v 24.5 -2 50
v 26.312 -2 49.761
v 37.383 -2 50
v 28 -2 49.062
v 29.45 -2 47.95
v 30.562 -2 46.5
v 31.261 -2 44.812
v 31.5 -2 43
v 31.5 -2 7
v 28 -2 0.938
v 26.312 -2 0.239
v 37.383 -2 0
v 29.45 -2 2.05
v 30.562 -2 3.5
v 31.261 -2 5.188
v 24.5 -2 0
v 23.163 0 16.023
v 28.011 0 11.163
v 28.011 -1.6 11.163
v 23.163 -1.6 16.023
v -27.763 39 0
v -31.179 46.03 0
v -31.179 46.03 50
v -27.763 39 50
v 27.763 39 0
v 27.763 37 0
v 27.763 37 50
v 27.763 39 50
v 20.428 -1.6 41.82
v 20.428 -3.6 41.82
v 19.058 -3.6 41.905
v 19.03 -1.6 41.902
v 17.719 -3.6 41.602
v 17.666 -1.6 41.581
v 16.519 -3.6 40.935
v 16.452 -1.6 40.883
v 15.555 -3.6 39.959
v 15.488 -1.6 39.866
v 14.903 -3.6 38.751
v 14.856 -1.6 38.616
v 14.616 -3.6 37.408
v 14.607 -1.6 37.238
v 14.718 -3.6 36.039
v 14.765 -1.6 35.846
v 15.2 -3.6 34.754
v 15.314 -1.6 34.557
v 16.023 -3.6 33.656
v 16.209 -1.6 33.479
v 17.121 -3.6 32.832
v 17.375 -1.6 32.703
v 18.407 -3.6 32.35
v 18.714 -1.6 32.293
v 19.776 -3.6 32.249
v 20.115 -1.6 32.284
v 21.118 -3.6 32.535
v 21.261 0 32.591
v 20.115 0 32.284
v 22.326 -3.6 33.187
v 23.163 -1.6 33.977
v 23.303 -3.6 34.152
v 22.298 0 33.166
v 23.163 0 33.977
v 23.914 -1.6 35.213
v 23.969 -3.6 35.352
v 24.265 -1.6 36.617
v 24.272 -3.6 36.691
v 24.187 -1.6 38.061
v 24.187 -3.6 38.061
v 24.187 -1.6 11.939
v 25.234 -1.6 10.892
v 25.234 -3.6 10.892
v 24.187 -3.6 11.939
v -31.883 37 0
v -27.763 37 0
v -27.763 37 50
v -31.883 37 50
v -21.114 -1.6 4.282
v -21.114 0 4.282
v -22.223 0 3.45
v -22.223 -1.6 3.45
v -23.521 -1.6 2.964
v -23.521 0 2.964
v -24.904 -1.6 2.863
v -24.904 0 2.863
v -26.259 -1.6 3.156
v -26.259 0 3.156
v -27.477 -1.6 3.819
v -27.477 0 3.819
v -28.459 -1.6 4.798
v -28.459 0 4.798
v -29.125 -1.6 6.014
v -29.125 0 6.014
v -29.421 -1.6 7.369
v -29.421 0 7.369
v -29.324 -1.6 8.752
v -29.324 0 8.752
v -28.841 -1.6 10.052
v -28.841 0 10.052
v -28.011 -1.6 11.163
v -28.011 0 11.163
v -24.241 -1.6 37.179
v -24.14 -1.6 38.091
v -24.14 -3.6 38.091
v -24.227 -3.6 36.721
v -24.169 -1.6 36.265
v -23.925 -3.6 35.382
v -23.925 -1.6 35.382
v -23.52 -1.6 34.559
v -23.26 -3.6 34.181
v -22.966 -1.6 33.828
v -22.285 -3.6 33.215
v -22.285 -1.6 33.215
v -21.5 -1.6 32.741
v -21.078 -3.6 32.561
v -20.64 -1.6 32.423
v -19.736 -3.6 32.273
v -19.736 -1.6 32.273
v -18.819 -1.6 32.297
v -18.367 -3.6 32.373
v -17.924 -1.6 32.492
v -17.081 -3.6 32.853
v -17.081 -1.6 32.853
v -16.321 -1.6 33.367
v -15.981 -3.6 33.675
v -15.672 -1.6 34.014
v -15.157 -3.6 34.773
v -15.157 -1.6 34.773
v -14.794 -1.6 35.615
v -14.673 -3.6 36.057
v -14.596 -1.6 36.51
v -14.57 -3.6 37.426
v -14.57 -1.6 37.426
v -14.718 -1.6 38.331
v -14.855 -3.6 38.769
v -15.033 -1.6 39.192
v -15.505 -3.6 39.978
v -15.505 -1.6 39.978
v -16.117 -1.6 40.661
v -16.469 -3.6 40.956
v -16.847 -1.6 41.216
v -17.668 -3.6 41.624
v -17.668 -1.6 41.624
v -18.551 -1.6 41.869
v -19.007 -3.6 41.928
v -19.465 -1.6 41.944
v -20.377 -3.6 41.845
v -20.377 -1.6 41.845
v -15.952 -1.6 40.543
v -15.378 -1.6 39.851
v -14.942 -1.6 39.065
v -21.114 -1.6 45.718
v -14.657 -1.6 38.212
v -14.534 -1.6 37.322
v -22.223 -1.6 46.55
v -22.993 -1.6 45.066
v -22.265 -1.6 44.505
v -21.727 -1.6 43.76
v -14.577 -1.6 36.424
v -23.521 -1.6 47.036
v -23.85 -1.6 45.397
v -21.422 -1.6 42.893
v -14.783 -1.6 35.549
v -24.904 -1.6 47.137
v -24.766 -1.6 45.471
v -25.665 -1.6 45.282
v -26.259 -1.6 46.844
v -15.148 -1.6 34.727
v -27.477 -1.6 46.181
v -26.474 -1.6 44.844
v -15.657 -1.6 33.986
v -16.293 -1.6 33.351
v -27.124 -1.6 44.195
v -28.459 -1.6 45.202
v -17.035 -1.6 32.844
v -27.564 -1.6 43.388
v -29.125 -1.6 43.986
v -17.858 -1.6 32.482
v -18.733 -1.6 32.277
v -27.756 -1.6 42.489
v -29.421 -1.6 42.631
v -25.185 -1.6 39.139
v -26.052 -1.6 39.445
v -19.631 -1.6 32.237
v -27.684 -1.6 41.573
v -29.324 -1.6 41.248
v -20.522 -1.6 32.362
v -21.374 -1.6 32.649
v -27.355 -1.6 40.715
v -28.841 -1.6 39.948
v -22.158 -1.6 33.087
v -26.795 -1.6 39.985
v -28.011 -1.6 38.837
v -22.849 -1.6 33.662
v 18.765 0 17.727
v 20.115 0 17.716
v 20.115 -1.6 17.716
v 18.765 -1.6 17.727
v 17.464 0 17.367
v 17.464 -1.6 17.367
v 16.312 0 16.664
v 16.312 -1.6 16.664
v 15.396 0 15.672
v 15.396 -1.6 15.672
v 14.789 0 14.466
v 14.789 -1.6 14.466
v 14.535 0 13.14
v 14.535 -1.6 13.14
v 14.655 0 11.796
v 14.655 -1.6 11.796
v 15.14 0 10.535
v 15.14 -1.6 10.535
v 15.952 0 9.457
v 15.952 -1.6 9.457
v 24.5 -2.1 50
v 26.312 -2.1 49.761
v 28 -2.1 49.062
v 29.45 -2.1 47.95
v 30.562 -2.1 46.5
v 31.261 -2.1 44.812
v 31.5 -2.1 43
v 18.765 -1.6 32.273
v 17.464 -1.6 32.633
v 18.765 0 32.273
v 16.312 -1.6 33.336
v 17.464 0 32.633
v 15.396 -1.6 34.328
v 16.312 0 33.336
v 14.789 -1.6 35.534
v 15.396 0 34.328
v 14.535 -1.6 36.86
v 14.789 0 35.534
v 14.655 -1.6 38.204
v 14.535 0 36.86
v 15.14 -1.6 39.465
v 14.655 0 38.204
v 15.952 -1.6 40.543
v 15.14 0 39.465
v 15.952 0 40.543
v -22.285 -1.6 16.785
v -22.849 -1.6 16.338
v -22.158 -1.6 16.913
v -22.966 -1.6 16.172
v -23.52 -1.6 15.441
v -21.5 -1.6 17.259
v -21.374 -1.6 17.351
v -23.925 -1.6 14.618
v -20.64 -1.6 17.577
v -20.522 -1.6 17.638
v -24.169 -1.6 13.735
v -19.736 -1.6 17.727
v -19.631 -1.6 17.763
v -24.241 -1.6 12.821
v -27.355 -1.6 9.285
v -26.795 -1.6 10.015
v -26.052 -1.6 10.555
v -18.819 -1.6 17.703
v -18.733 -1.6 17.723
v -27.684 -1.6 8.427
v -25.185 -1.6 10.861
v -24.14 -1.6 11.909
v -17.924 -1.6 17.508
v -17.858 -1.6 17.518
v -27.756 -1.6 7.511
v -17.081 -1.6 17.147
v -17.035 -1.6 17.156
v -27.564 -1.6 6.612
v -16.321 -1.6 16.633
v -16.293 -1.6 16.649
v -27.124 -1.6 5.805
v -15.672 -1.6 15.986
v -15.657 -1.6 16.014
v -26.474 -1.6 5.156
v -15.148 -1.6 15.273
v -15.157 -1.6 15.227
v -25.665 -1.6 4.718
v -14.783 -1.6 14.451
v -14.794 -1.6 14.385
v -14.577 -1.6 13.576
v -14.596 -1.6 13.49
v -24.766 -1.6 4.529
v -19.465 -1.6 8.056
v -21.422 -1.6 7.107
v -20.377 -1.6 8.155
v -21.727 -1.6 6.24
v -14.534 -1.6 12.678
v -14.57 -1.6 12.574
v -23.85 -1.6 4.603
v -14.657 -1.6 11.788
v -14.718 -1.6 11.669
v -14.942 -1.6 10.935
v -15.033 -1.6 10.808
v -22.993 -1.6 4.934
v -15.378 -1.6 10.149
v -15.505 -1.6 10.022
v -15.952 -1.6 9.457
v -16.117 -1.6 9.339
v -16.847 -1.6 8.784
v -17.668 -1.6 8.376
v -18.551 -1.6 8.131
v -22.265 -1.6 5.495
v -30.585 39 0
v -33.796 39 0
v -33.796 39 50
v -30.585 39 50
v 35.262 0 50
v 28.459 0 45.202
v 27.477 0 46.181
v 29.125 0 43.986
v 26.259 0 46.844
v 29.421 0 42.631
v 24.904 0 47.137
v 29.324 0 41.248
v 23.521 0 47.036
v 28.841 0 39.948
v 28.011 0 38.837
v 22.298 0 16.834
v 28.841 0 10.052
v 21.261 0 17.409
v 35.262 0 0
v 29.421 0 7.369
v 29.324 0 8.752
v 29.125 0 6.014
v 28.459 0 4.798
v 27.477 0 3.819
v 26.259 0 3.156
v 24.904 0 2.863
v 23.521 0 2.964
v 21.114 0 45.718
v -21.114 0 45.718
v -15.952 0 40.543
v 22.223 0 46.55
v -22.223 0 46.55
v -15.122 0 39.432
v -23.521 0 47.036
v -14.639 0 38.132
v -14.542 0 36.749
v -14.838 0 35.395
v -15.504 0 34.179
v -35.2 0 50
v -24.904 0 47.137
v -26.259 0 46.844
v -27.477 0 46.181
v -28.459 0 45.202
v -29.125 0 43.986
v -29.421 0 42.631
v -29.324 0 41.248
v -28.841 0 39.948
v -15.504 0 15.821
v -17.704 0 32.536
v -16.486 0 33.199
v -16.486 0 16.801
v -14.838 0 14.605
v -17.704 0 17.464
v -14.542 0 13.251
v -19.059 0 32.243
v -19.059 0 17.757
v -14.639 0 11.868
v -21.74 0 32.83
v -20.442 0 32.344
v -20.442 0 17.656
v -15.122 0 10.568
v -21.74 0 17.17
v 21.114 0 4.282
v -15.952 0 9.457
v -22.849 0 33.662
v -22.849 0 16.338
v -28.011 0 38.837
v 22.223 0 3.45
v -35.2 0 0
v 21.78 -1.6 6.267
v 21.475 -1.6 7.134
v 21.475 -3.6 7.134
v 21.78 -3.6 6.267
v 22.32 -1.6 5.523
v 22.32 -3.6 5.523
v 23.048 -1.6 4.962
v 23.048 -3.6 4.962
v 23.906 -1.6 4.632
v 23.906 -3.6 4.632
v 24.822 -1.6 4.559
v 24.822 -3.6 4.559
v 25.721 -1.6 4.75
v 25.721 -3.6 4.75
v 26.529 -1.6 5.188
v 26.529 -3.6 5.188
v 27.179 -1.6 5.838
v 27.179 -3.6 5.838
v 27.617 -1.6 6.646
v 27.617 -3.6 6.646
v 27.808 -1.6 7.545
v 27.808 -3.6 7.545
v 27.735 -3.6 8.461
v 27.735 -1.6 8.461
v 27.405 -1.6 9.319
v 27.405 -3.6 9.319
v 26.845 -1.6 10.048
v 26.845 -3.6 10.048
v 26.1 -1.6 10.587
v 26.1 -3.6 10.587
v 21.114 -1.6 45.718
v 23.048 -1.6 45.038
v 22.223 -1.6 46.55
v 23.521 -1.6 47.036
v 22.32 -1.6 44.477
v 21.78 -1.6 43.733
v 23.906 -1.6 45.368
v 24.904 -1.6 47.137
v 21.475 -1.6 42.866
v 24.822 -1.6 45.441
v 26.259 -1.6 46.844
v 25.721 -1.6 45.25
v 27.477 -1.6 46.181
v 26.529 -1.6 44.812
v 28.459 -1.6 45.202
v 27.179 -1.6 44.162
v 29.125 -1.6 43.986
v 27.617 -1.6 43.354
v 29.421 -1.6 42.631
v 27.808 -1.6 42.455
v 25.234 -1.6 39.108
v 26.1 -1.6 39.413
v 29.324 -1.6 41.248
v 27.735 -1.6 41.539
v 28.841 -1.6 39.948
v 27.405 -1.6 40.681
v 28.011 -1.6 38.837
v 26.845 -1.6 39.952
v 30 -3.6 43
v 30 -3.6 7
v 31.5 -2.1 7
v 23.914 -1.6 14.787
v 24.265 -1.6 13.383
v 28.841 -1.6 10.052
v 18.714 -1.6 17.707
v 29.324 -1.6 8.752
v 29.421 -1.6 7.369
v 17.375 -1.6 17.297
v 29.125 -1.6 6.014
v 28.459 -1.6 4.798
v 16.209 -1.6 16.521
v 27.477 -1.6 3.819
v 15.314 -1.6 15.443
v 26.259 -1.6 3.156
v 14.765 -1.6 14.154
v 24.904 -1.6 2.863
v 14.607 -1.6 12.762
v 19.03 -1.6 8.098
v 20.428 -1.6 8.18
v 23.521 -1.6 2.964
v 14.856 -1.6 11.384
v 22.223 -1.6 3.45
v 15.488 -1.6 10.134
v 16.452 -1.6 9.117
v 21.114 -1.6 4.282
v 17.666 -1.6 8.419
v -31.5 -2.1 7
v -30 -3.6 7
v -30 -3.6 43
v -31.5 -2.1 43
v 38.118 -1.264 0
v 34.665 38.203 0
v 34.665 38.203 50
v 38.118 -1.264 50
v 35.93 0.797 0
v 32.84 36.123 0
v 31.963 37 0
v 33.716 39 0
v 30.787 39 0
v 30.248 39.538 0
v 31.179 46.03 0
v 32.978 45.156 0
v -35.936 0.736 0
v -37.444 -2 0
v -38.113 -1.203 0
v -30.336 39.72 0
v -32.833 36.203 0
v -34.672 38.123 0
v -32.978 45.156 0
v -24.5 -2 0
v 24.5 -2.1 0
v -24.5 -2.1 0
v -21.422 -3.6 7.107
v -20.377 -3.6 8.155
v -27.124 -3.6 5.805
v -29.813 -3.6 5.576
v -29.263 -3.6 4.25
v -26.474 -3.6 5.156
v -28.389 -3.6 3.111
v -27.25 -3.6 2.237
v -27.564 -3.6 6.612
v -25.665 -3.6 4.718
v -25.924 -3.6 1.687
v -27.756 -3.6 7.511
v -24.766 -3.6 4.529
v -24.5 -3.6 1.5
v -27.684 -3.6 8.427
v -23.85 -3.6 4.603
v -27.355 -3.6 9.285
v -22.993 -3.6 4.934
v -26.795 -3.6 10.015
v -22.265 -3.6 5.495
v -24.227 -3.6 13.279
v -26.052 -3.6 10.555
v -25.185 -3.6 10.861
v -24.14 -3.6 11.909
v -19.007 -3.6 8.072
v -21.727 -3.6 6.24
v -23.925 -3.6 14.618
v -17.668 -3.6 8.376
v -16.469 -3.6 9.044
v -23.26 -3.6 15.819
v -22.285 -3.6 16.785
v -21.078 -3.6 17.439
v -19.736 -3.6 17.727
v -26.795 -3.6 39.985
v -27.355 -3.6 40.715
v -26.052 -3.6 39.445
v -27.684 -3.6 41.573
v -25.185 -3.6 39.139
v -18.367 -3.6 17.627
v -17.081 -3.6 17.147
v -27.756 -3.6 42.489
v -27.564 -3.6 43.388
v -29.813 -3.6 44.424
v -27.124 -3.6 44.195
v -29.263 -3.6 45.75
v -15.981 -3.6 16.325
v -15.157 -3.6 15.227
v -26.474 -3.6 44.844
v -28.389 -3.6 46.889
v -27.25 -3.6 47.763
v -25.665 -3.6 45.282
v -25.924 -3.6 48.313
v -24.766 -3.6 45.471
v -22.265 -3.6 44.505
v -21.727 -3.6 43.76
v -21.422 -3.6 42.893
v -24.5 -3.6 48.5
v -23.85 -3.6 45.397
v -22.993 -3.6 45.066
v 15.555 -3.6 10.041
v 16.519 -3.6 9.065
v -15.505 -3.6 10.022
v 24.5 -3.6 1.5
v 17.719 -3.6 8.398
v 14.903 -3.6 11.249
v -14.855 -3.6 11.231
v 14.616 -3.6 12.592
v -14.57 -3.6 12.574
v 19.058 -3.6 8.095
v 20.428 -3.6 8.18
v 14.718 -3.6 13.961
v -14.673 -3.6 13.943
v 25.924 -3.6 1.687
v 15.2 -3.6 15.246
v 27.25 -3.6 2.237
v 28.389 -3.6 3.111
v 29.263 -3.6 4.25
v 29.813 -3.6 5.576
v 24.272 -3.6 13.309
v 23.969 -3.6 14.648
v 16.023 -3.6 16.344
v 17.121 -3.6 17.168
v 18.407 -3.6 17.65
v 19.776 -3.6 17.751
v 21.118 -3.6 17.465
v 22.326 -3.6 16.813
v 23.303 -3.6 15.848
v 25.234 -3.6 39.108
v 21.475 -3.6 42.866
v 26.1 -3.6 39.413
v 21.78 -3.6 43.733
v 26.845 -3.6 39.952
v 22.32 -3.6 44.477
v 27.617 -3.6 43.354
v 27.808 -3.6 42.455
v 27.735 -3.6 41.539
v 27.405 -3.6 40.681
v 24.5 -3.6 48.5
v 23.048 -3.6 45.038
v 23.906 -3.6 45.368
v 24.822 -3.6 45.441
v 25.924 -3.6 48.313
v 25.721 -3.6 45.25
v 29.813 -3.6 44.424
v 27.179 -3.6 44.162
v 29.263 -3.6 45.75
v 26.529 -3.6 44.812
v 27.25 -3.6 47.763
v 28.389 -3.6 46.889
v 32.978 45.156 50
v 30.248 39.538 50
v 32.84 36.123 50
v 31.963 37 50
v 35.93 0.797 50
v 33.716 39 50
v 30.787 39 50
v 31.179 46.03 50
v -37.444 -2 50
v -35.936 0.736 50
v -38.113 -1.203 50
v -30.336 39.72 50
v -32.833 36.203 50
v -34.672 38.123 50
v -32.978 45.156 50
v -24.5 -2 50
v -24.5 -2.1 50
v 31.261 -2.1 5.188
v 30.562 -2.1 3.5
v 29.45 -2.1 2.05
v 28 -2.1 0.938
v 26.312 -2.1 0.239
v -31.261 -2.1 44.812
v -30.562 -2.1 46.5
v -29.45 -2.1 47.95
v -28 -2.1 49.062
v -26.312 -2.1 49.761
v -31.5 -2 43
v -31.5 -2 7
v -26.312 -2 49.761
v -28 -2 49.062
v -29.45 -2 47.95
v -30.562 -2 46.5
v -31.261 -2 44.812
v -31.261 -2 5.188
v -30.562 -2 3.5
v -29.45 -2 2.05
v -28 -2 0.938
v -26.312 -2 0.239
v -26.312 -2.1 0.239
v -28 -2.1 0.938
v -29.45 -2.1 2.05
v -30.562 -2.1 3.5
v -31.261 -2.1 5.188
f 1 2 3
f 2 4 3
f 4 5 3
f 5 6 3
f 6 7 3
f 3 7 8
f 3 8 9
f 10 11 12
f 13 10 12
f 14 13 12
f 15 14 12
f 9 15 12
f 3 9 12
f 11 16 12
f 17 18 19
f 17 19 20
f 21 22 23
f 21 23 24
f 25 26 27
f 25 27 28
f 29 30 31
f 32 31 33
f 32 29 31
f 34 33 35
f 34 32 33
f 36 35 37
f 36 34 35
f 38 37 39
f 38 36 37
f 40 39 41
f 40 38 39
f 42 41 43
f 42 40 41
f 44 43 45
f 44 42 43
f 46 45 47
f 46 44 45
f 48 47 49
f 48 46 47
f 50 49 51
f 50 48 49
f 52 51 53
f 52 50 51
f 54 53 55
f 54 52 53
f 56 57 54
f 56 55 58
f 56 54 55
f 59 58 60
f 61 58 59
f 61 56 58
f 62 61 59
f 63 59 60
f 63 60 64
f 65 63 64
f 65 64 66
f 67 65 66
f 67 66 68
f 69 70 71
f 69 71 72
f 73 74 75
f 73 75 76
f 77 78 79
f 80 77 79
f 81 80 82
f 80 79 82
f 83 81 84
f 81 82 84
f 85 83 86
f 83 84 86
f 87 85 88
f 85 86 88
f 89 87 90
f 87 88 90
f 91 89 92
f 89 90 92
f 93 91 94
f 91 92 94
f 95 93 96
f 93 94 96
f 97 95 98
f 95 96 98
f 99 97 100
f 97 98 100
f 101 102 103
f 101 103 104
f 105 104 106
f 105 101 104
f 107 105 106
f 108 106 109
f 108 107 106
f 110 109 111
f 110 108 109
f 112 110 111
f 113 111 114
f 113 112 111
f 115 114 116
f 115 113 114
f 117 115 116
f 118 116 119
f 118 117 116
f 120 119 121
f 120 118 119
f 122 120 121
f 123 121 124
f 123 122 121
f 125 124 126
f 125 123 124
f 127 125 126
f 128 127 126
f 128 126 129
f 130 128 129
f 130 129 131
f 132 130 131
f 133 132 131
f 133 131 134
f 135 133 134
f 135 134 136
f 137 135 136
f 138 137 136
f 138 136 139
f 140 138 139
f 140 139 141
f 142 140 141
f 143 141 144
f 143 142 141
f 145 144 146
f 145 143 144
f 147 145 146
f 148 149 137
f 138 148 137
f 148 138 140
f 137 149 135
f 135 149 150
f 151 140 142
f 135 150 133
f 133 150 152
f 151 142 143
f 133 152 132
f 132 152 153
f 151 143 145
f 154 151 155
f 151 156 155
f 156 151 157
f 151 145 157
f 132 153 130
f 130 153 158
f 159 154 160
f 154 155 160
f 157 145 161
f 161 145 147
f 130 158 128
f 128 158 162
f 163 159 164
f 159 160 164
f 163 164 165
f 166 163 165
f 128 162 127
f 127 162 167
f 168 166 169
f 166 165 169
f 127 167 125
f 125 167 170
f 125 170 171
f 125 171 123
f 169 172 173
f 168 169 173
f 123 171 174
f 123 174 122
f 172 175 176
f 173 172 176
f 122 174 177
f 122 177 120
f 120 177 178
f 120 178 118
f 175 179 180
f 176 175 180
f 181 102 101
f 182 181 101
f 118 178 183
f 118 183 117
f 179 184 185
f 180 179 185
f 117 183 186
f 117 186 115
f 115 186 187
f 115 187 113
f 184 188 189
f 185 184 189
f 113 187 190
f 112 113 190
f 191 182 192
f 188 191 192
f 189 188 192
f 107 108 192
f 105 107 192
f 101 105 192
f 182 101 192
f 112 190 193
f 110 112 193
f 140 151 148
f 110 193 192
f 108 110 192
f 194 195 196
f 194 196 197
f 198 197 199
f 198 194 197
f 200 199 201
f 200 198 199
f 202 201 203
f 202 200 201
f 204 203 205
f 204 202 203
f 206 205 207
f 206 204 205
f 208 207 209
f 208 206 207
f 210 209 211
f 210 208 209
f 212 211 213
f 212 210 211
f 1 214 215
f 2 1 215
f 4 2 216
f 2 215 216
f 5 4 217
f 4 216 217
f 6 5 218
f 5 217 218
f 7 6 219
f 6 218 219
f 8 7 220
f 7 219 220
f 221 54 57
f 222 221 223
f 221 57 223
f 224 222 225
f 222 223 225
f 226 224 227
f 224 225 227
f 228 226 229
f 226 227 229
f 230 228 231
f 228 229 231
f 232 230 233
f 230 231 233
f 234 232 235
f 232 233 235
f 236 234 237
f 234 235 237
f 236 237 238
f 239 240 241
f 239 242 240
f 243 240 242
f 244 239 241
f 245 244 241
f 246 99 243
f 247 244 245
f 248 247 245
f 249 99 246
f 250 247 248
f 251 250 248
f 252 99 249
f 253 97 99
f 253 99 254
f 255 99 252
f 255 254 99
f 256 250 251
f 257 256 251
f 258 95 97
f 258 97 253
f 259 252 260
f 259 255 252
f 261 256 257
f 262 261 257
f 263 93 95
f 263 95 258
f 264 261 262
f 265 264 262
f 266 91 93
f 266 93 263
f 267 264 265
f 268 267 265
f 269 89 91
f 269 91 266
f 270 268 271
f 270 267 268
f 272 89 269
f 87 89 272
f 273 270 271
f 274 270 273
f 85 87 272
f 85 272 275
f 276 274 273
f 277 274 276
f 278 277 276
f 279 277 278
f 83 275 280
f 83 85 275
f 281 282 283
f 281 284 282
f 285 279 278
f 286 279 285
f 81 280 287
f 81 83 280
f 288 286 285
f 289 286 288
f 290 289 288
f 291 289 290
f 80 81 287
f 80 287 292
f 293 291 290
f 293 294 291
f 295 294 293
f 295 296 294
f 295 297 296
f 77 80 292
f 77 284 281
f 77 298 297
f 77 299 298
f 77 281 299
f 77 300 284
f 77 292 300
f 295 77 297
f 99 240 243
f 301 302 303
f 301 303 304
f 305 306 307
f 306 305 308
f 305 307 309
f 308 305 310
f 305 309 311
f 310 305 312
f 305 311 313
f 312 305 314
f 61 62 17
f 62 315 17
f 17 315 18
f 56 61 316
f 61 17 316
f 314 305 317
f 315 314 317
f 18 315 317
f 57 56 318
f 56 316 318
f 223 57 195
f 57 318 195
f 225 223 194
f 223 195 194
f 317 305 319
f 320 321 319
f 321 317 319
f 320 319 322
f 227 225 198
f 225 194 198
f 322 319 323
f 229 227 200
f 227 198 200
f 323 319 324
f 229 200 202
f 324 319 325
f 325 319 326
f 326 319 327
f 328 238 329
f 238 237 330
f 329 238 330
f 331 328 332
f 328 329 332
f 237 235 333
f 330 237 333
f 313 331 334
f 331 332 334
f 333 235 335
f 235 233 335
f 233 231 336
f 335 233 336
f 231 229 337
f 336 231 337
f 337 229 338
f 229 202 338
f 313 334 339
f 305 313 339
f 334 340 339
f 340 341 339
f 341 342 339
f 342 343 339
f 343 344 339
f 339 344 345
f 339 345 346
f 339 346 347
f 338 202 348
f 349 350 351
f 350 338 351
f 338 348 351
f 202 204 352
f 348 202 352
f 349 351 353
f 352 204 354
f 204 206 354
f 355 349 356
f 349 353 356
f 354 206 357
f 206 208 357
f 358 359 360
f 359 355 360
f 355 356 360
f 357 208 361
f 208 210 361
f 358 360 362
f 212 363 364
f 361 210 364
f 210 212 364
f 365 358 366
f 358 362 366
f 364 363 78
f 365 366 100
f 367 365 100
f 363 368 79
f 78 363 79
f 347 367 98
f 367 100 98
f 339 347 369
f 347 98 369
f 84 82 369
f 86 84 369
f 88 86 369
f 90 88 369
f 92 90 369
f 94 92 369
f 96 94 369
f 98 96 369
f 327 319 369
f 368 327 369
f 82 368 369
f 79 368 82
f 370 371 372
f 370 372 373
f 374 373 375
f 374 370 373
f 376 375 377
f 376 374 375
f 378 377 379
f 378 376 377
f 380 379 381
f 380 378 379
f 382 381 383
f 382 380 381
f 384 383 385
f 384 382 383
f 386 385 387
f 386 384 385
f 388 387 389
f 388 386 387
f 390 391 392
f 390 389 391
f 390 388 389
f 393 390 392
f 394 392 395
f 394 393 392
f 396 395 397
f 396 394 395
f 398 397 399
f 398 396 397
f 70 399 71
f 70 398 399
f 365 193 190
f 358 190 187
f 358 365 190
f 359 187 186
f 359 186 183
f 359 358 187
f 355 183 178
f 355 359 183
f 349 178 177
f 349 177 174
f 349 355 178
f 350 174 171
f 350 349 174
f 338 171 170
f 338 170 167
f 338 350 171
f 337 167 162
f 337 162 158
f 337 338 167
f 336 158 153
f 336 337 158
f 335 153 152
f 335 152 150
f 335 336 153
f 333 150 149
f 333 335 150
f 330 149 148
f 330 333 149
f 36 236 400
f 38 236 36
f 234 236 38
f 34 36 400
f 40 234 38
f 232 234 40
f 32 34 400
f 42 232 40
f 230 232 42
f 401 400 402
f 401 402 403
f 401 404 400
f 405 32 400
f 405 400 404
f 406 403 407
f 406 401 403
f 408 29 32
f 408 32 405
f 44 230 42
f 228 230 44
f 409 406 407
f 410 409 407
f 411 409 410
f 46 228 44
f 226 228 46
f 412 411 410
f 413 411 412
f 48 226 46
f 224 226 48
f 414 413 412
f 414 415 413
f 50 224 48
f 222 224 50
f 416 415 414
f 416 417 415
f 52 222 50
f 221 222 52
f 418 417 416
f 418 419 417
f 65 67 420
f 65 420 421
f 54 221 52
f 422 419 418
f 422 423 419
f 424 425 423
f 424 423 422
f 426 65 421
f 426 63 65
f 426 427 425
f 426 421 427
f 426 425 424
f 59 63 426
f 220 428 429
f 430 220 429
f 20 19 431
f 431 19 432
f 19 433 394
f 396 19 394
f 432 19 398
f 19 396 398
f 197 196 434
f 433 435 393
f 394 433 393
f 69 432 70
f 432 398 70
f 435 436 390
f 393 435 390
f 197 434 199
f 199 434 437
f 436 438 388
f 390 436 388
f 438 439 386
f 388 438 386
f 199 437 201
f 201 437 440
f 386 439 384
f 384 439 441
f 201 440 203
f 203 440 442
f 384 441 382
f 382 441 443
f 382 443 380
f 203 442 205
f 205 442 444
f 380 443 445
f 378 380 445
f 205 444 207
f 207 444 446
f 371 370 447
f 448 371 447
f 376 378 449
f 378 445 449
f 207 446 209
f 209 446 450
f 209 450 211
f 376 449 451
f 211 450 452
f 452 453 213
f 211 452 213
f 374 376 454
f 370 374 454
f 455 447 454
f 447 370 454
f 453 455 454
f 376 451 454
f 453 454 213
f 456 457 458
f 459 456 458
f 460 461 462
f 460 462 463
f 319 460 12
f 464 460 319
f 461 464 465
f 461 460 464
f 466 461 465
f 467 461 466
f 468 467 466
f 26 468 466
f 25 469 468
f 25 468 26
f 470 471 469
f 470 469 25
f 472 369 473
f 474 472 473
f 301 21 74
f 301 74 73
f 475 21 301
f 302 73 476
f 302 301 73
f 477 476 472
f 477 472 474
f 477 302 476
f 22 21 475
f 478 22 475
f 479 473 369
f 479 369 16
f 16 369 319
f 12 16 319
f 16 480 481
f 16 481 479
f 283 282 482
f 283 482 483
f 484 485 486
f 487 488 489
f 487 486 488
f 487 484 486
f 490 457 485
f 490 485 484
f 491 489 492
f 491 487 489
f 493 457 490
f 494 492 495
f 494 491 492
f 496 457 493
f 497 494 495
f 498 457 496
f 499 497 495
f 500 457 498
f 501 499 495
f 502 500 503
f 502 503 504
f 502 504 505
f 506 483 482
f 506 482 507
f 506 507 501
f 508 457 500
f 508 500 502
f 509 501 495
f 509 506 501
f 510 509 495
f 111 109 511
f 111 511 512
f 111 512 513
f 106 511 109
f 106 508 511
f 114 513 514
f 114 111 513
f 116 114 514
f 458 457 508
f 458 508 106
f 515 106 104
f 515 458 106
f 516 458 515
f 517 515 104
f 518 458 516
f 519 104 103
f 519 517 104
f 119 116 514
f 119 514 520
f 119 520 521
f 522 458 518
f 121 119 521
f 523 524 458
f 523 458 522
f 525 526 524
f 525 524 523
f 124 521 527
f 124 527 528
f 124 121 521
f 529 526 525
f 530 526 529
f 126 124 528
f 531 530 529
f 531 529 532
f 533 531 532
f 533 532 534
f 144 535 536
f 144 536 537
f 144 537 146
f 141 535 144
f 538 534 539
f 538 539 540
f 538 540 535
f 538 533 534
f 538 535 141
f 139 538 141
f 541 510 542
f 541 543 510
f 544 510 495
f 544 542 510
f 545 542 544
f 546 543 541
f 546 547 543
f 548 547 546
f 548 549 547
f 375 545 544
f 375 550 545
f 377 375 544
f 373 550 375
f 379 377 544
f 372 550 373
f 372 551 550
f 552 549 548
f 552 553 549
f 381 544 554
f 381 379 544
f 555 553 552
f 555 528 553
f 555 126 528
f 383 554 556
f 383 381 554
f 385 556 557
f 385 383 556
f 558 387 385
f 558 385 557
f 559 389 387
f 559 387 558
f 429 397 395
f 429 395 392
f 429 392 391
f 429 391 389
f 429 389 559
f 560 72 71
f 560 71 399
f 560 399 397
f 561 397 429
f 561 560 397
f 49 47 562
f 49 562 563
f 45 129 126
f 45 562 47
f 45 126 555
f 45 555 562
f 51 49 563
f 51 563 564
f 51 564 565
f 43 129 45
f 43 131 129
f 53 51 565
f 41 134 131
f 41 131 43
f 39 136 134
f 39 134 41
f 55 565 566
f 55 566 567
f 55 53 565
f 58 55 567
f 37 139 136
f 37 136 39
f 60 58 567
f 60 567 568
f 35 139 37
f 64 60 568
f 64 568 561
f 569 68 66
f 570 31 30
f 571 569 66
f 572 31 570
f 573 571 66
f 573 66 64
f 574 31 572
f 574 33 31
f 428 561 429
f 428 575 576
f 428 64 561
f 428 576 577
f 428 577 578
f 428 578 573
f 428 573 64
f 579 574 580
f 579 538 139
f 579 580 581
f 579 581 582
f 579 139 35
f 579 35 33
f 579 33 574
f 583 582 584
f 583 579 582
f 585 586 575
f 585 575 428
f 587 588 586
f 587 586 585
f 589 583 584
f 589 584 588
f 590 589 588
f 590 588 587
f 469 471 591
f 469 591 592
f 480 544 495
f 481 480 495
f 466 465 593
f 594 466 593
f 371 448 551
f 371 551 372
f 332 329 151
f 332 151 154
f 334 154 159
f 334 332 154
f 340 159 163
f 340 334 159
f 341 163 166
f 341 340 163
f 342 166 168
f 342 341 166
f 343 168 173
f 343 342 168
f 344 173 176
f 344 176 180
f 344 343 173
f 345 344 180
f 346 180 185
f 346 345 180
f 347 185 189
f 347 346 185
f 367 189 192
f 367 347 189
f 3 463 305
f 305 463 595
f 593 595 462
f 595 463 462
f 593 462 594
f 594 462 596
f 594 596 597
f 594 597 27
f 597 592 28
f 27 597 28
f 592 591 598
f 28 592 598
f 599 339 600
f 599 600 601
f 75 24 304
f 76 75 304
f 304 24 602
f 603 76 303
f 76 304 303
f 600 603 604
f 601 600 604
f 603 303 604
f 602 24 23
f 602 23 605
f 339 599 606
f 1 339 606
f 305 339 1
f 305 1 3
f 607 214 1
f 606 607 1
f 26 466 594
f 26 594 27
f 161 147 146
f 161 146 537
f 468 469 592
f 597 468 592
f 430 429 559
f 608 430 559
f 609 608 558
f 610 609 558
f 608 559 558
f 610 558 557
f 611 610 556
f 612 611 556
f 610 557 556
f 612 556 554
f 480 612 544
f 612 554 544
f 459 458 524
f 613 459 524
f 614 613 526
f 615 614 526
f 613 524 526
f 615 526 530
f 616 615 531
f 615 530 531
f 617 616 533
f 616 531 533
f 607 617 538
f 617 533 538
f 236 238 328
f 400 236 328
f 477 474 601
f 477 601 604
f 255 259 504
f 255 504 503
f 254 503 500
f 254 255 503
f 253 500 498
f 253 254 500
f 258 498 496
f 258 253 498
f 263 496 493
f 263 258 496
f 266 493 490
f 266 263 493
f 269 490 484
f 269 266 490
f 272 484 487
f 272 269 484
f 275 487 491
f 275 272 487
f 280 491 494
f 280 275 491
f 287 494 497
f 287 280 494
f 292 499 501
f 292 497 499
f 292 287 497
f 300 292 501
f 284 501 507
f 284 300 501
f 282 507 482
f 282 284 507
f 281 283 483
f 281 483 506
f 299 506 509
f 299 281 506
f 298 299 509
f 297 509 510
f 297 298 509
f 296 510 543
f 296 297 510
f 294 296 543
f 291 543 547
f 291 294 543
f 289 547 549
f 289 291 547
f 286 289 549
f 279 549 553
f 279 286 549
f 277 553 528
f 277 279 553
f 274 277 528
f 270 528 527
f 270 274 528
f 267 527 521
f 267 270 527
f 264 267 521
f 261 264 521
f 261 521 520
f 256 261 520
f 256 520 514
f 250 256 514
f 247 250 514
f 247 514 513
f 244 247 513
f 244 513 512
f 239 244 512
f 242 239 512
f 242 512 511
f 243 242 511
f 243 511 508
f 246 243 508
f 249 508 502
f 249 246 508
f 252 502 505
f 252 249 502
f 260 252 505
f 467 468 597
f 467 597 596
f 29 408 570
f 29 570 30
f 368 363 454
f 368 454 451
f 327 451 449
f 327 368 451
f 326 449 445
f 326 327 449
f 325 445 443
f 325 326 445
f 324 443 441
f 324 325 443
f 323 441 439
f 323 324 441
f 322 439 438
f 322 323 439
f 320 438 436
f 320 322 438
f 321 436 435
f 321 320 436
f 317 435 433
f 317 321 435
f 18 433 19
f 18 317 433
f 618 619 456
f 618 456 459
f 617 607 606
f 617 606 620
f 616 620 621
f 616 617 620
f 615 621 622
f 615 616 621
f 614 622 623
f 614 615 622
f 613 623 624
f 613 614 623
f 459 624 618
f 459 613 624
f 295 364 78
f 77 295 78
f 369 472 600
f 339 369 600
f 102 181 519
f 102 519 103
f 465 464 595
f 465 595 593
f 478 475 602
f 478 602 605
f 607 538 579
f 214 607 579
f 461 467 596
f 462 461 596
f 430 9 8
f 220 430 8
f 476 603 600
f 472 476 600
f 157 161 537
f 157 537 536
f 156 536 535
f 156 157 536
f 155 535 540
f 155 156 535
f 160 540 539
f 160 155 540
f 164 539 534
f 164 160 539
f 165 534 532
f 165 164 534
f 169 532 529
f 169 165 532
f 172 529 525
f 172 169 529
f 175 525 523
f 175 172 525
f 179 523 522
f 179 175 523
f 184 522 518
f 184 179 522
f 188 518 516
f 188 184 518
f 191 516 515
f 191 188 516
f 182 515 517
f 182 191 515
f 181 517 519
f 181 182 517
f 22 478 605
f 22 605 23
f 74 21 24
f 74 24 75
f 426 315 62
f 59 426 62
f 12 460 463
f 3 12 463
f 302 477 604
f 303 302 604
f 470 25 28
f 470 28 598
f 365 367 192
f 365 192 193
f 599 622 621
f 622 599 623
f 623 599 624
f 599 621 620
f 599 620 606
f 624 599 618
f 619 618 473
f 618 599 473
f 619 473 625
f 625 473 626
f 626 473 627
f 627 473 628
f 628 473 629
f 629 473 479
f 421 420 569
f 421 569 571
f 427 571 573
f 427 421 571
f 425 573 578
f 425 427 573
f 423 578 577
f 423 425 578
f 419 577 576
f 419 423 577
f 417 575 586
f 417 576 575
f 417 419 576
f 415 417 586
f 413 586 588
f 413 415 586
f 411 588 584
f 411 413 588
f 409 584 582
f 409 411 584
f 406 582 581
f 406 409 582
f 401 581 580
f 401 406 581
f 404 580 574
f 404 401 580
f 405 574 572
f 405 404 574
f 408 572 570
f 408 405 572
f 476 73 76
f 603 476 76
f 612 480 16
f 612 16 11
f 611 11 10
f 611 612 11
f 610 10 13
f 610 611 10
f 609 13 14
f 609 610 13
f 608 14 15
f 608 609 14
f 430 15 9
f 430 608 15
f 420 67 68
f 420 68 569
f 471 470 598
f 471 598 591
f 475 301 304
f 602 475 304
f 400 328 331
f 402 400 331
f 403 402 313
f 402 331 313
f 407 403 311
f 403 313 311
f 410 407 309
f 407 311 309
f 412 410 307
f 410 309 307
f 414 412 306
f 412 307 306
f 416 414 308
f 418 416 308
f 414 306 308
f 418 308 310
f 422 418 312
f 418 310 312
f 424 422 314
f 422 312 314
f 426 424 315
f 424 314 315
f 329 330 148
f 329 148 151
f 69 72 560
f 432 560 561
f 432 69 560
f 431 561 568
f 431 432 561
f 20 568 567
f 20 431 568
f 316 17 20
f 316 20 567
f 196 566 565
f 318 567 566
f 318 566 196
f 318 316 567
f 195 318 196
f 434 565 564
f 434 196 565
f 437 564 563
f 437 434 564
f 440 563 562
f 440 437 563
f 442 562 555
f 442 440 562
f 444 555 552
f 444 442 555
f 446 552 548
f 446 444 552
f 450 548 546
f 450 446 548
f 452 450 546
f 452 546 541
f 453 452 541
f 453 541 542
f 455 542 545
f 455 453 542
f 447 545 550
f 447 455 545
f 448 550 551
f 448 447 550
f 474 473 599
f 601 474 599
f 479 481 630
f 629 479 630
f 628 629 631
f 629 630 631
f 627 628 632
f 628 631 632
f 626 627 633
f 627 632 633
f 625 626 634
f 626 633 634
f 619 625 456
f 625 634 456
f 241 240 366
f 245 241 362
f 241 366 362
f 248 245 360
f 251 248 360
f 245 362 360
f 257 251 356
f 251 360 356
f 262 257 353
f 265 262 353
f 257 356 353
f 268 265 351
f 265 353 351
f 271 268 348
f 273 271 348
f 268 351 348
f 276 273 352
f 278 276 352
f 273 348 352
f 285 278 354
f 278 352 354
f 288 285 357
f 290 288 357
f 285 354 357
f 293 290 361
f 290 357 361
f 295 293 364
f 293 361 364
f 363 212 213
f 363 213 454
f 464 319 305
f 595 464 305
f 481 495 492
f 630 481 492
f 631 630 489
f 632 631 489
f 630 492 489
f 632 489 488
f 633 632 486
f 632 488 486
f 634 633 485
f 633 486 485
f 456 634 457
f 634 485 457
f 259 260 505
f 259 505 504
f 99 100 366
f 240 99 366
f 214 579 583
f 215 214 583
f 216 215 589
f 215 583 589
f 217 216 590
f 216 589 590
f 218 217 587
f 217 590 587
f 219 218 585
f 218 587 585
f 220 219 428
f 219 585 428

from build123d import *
from OCP.BRepFilletAPI import BRepFilletAPI_MakeChamfer

# Parameters (mm, degrees)
BOSS_EXTRUDE1_DEPTH = 50
SKETCH5_W           = 63
SKETCH5_H           = 50
BOSS_EXTRUDE2_DEPTH = 1.6
CHAMFER6_SIZE       = 0.8
CHAMFER6_SIZE2      = 0.738449877
CHAMFER7_SIZE       = 0.8
CHAMFER7_SIZE2      = 0.880050294
CHAMFER7_SIZE2_2    = 0.59857957
FILLET1_R           = 7
CHAMFER10_SIZE      = 1.5
CUT_EXTRUDE5_REACH  = 79.922
CUT_EXTRUDE6_DEPTH  = 1.6


with BuildPart() as part:
    # Sketch1 → Boss-Extrude1 (new body)
    with BuildSketch(Plane.XY):
        Polygon((-34.595581798, 39), (-29.986555798, 39), (-32.97810591, 45.15618727), (-31.179250624, 46.030326652), (-27.76291945, 39), (-27.76291945, 37), (-32.76291945, 37), (-36, 0), (0, 0), (36, 0), (32.76291945, 37), (27.76291945, 37), (27.76291945, 39), (31.179250624, 46.030326652), (32.97810591, 45.15618727), (29.986555798, 39), (34.595581798, 39), (38.182617002, -2), (0, -2), (-38.182617002, -2), align=None)
    extrude(amount=BOSS_EXTRUDE1_DEPTH)

    # Sketch5 → Boss-Extrude2 (add)
    with BuildSketch(Plane.XZ.offset(2)):
        with Locations((0, 25)):
            Rectangle(SKETCH5_W, SKETCH5_H)
    extrude(amount=BOSS_EXTRUDE2_DEPTH)

    # Chamfer6: one chamfer whose edges measure the first distance from different faces: ONE call of the kernel's chamfer builder (chamfer() names one face for all edges)
    chamfer6_edges_1 = [part.edges().sort_by_distance(p)[0] for p in [
        (-36, 0, 25),
    ]]
    chamfer6_side_1 = [part.faces().sort_by_distance(p)[0] for p in [
        (0, 0, 25),
    ]]
    chamfer6_edges_2 = [part.edges().sort_by_distance(p)[0] for p in [
        (36, 0, 25),
    ]]
    chamfer6_side_2 = [part.faces().sort_by_distance(p)[0] for p in [
        (34.381459725, 18.5, 25),
    ]]
    chamfer6_edges_3 = [part.edges().sort_by_distance(p)[0] for p in [
        (38.182617002, -2, 25),
    ]]
    chamfer6_side_3 = [part.faces().sort_by_distance(p)[0] for p in [
        (34.841308501, -2, 25),
    ]]
    chamfer6_edges_4 = [part.edges().sort_by_distance(p)[0] for p in [
        (-38.182617002, -2, 25),
    ]]
    chamfer6_side_4 = [part.faces().sort_by_distance(p)[0] for p in [
        (-36.3890994, 18.5, 25),
    ]]
    chamfer6 = BRepFilletAPI_MakeChamfer(part.part.solid().wrapped)
    for e in chamfer6_edges_1:
        chamfer6.Add(CHAMFER6_SIZE, CHAMFER6_SIZE2, e.wrapped, chamfer6_side_1[0].wrapped)  # the first distance lies on this face
    for e in chamfer6_edges_2:
        chamfer6.Add(CHAMFER6_SIZE, CHAMFER6_SIZE2, e.wrapped, chamfer6_side_2[0].wrapped)  # the first distance lies on this face
    for e in chamfer6_edges_3:
        chamfer6.Add(CHAMFER6_SIZE, CHAMFER6_SIZE2, e.wrapped, chamfer6_side_3[0].wrapped)  # the first distance lies on this face
    for e in chamfer6_edges_4:
        chamfer6.Add(CHAMFER6_SIZE, CHAMFER6_SIZE2, e.wrapped, chamfer6_side_4[0].wrapped)  # the first distance lies on this face
    add(Compound.cast(chamfer6.Shape()), mode=Mode.REPLACE)

    # Chamfer7: one chamfer whose edges measure the first distance from different faces: ONE call of the kernel's chamfer builder (chamfer() names one face for all edges)
    chamfer7_edges_1 = [part.edges().sort_by_distance(p)[0] for p in [
        (-32.76291945, 37, 25),
    ]]
    chamfer7_side_1 = [part.faces().sort_by_distance(p)[0] for p in [
        (-34.349279651, 18.867819926, 25),
    ]]
    chamfer7_edges_2 = [part.edges().sort_by_distance(p)[0] for p in [
        (32.76291945, 37, 25),
    ]]
    chamfer7_side_2 = [part.faces().sort_by_distance(p)[0] for p in [
        (30.26291945, 37, 25),
    ]]
    chamfer7_edges_3 = [part.edges().sort_by_distance(p)[0] for p in [
        (29.986555798, 39, 25),
    ]]
    chamfer7_side_3 = [part.faces().sort_by_distance(p)[0] for p in [
        (32.291068798, 39, 25),
    ]]
    chamfer7_edges_4 = [part.edges().sort_by_distance(p)[0] for p in [
        (34.595581798, 39, 25),
    ]]
    chamfer7_side_4 = [part.faces().sort_by_distance(p)[0] for p in [
        (36.356919326, 18.867819926, 25),
    ]]
    chamfer7_edges_5 = [part.edges().sort_by_distance(p)[0] for p in [
        (-34.595581798, 39, 25),
    ]]
    chamfer7_side_5 = [part.faces().sort_by_distance(p)[0] for p in [
        (-32.291068798, 39, 25),
    ]]
    chamfer7_edges_6 = [part.edges().sort_by_distance(p)[0] for p in [
        (-29.986555798, 39, 25),
    ]]
    chamfer7_side_6 = [part.faces().sort_by_distance(p)[0] for p in [
        (-31.482330854, 42.078093635, 25),
    ]]
    chamfer7 = BRepFilletAPI_MakeChamfer(part.part.solid().wrapped)
    for e in chamfer7_edges_1:
        chamfer7.Add(CHAMFER7_SIZE, CHAMFER7_SIZE2, e.wrapped, chamfer7_side_1[0].wrapped)  # the first distance lies on this face
    for e in chamfer7_edges_2:
        chamfer7.Add(CHAMFER7_SIZE, CHAMFER7_SIZE2, e.wrapped, chamfer7_side_2[0].wrapped)  # the first distance lies on this face
    for e in chamfer7_edges_3:
        chamfer7.Add(CHAMFER7_SIZE, CHAMFER7_SIZE2_2, e.wrapped, chamfer7_side_3[0].wrapped)  # the first distance lies on this face
    for e in chamfer7_edges_4:
        chamfer7.Add(CHAMFER7_SIZE, CHAMFER7_SIZE2, e.wrapped, chamfer7_side_4[0].wrapped)  # the first distance lies on this face
    for e in chamfer7_edges_5:
        chamfer7.Add(CHAMFER7_SIZE, CHAMFER7_SIZE2, e.wrapped, chamfer7_side_5[0].wrapped)  # the first distance lies on this face
    for e in chamfer7_edges_6:
        chamfer7.Add(CHAMFER7_SIZE, CHAMFER7_SIZE2_2, e.wrapped, chamfer7_side_6[0].wrapped)  # the first distance lies on this face
    add(Compound.cast(chamfer7.Shape()), mode=Mode.REPLACE)

    # Fillet1
    fillet1_edges = [part.edges().sort_by_distance(p)[0] for p in [
        (-31.5, -2.8, 0),
        (31.5, -2.8, 0),
        (31.5, -2.8, 50),
        (-31.5, -2.8, 50),
    ]]
    fillet(fillet1_edges, radius=FILLET1_R)

    # Chamfer10
    chamfer10_edges = [part.edges().sort_by_distance(p)[0] for p in [
        (-31.5, -3.6, 25),
        (0, -3.6, 50),
        (0, -3.6, 0),
        (31.5, -3.6, 25),
        (29.449747468, -3.6, 47.949747468),
        (29.449747468, -3.6, 2.050252532),
        (-29.449747468, -3.6, 2.050252532),
        (-29.449747468, -3.6, 47.949747468),
    ]]
    chamfer(chamfer10_edges, length=CHAMFER10_SIZE)

    # Sketch15 → Cut-Extrude5 (cut, up to next)
    with BuildSketch(Plane(origin=(0, 0, 0), x_dir=(1, 0, 0), z_dir=(0, 1, 0)), mode=Mode.PRIVATE) as cut_extrude5_sk1:
        with BuildLine():
            Line((21.475016583, -42.866268583), (20.428249938, -41.819501939))
            ThreePointArc((20.428249938, -41.819501939), (16.022847213, -33.655561292), (24.186787861, -38.060964016))
            Line((24.186787861, -38.060964016), (25.233554505, -39.107730661))
            ThreePointArc((25.233554505, -39.107730661), (26.877324102, -44.51003818), (21.475016583, -42.866268583))
        make_face()
    cut_extrude5_tool1 = extrude(cut_extrude5_sk1.sketch, amount=-CUT_EXTRUDE5_REACH, mode=Mode.PRIVATE) & part.part
    # Sketch15 → Cut-Extrude5 (cut, up to next)
    with BuildSketch(Plane(origin=(0, 0, 0), x_dir=(1, 0, 0), z_dir=(0, 1, 0)), mode=Mode.PRIVATE) as cut_extrude5_sk2:
        with BuildLine():
            Line((-25.185393692, -39.138763585), (-24.139916413, -38.090709162))
            ThreePointArc((-24.139916413, -38.090709162), (-15.98140501, -33.675259948), (-20.37675457, -41.844617469))
            Line((-20.37675457, -41.844617469), (-21.422231849, -42.892671893))
            ThreePointArc((-21.422231849, -42.892671893), (-26.822511792, -44.543090495), (-25.185393692, -39.138763585))
        make_face()
    cut_extrude5_tool2 = extrude(cut_extrude5_sk2.sketch, amount=-CUT_EXTRUDE5_REACH, mode=Mode.PRIVATE) & part.part
    # Sketch15 → Cut-Extrude5 (cut, up to next)
    with BuildSketch(Plane(origin=(0, 0, 0), x_dir=(1, 0, 0), z_dir=(0, 1, 0)), mode=Mode.PRIVATE) as cut_extrude5_sk3:
        with BuildLine():
            Line((25.233554505, -10.892269339), (24.186787861, -11.939035984))
            ThreePointArc((24.186787861, -11.939035984), (16.022847213, -16.344438708), (20.428249938, -8.180498061))
            Line((20.428249938, -8.180498061), (21.475016583, -7.133731417))
            ThreePointArc((21.475016583, -7.133731417), (26.877324102, -5.48996182), (25.233554505, -10.892269339))
        make_face()
    cut_extrude5_tool3 = extrude(cut_extrude5_sk3.sketch, amount=-CUT_EXTRUDE5_REACH, mode=Mode.PRIVATE) & part.part
    # Sketch15 → Cut-Extrude5 (cut, up to next)
    with BuildSketch(Plane(origin=(0, 0, 0), x_dir=(1, 0, 0), z_dir=(0, 1, 0)), mode=Mode.PRIVATE) as cut_extrude5_sk4:
        with BuildLine():
            Line((-21.422231849, -7.107328107), (-20.37675457, -8.155382531))
            ThreePointArc((-20.37675457, -8.155382531), (-15.98140501, -16.324740052), (-24.139916413, -11.909290838))
            Line((-24.139916413, -11.909290838), (-25.185393692, -10.861236415))
            ThreePointArc((-25.185393692, -10.861236415), (-26.822511792, -5.456909505), (-21.422231849, -7.107328107))
        make_face()
    cut_extrude5_tool4 = extrude(cut_extrude5_sk4.sketch, amount=-CUT_EXTRUDE5_REACH, mode=Mode.PRIVATE) & part.part
    add(cut_extrude5_tool1.solids().sort_by_distance((21.014912, 0, 38.647626))[0], mode=Mode.SUBTRACT)
    add(cut_extrude5_tool2.solids().sort_by_distance((-20.96732, 0, 38.673466))[0], mode=Mode.SUBTRACT)
    add(cut_extrude5_tool3.solids().sort_by_distance((21.014912, 0, 11.352374))[0], mode=Mode.SUBTRACT)
    add(cut_extrude5_tool4.solids().sort_by_distance((-20.96732, 0, 11.326534))[0], mode=Mode.SUBTRACT)

    # Sketch16 → Cut-Extrude6 (cut)
    with BuildSketch(Plane(origin=(0, 0, 0), x_dir=(1, 0, 0), z_dir=(0, 1, 0))):
        with BuildLine():
            Line((-15.951616609, -40.543181032), (-21.113676241, -45.71796535))
            ThreePointArc((-21.113676241, -45.71796535), (-28.002957525, -45.726446075), (-28.011438251, -38.837164791))
            Line((-28.011438251, -38.837164791), (-22.849378618, -33.662380473))
            ThreePointArc((-22.849378618, -33.662380473), (-15.960097334, -33.653899748), (-15.951616609, -40.543181032))
        make_face()
        with BuildLine():
            Line((-15.951616609, -9.456818968), (-21.113676241, -4.28203465))
            ThreePointArc((-21.113676241, -4.28203465), (-28.002957525, -4.273553925), (-28.011438251, -11.162835209))
            Line((-28.011438251, -11.162835209), (-22.849378618, -16.337619527))
            ThreePointArc((-22.849378618, -16.337619527), (-15.960097334, -16.346100252), (-15.951616609, -9.456818968))
        make_face()
        with BuildLine():
            Line((15.951616609, -40.543181032), (21.113676241, -45.71796535))
            ThreePointArc((21.113676241, -45.71796535), (28.002957525, -45.726446075), (28.011438251, -38.837164791))
            Line((28.011438251, -38.837164791), (22.849378618, -33.662380473))
            ThreePointArc((22.849378618, -33.662380473), (15.960097334, -33.653899748), (15.951616609, -40.543181032))
        make_face()
        with BuildLine():
            Line((15.951616609, -9.456818968), (21.113676241, -4.28203465))
            ThreePointArc((21.113676241, -4.28203465), (28.002957525, -4.273553925), (28.011438251, -11.162835209))
            Line((28.011438251, -11.162835209), (22.849378618, -16.337619527))
            ThreePointArc((22.849378618, -16.337619527), (15.960097334, -16.346100252), (15.951616609, -9.456818968))
        make_face()
    extrude(amount=-CUT_EXTRUDE6_DEPTH, mode=Mode.SUBTRACT)


solid = part.part
